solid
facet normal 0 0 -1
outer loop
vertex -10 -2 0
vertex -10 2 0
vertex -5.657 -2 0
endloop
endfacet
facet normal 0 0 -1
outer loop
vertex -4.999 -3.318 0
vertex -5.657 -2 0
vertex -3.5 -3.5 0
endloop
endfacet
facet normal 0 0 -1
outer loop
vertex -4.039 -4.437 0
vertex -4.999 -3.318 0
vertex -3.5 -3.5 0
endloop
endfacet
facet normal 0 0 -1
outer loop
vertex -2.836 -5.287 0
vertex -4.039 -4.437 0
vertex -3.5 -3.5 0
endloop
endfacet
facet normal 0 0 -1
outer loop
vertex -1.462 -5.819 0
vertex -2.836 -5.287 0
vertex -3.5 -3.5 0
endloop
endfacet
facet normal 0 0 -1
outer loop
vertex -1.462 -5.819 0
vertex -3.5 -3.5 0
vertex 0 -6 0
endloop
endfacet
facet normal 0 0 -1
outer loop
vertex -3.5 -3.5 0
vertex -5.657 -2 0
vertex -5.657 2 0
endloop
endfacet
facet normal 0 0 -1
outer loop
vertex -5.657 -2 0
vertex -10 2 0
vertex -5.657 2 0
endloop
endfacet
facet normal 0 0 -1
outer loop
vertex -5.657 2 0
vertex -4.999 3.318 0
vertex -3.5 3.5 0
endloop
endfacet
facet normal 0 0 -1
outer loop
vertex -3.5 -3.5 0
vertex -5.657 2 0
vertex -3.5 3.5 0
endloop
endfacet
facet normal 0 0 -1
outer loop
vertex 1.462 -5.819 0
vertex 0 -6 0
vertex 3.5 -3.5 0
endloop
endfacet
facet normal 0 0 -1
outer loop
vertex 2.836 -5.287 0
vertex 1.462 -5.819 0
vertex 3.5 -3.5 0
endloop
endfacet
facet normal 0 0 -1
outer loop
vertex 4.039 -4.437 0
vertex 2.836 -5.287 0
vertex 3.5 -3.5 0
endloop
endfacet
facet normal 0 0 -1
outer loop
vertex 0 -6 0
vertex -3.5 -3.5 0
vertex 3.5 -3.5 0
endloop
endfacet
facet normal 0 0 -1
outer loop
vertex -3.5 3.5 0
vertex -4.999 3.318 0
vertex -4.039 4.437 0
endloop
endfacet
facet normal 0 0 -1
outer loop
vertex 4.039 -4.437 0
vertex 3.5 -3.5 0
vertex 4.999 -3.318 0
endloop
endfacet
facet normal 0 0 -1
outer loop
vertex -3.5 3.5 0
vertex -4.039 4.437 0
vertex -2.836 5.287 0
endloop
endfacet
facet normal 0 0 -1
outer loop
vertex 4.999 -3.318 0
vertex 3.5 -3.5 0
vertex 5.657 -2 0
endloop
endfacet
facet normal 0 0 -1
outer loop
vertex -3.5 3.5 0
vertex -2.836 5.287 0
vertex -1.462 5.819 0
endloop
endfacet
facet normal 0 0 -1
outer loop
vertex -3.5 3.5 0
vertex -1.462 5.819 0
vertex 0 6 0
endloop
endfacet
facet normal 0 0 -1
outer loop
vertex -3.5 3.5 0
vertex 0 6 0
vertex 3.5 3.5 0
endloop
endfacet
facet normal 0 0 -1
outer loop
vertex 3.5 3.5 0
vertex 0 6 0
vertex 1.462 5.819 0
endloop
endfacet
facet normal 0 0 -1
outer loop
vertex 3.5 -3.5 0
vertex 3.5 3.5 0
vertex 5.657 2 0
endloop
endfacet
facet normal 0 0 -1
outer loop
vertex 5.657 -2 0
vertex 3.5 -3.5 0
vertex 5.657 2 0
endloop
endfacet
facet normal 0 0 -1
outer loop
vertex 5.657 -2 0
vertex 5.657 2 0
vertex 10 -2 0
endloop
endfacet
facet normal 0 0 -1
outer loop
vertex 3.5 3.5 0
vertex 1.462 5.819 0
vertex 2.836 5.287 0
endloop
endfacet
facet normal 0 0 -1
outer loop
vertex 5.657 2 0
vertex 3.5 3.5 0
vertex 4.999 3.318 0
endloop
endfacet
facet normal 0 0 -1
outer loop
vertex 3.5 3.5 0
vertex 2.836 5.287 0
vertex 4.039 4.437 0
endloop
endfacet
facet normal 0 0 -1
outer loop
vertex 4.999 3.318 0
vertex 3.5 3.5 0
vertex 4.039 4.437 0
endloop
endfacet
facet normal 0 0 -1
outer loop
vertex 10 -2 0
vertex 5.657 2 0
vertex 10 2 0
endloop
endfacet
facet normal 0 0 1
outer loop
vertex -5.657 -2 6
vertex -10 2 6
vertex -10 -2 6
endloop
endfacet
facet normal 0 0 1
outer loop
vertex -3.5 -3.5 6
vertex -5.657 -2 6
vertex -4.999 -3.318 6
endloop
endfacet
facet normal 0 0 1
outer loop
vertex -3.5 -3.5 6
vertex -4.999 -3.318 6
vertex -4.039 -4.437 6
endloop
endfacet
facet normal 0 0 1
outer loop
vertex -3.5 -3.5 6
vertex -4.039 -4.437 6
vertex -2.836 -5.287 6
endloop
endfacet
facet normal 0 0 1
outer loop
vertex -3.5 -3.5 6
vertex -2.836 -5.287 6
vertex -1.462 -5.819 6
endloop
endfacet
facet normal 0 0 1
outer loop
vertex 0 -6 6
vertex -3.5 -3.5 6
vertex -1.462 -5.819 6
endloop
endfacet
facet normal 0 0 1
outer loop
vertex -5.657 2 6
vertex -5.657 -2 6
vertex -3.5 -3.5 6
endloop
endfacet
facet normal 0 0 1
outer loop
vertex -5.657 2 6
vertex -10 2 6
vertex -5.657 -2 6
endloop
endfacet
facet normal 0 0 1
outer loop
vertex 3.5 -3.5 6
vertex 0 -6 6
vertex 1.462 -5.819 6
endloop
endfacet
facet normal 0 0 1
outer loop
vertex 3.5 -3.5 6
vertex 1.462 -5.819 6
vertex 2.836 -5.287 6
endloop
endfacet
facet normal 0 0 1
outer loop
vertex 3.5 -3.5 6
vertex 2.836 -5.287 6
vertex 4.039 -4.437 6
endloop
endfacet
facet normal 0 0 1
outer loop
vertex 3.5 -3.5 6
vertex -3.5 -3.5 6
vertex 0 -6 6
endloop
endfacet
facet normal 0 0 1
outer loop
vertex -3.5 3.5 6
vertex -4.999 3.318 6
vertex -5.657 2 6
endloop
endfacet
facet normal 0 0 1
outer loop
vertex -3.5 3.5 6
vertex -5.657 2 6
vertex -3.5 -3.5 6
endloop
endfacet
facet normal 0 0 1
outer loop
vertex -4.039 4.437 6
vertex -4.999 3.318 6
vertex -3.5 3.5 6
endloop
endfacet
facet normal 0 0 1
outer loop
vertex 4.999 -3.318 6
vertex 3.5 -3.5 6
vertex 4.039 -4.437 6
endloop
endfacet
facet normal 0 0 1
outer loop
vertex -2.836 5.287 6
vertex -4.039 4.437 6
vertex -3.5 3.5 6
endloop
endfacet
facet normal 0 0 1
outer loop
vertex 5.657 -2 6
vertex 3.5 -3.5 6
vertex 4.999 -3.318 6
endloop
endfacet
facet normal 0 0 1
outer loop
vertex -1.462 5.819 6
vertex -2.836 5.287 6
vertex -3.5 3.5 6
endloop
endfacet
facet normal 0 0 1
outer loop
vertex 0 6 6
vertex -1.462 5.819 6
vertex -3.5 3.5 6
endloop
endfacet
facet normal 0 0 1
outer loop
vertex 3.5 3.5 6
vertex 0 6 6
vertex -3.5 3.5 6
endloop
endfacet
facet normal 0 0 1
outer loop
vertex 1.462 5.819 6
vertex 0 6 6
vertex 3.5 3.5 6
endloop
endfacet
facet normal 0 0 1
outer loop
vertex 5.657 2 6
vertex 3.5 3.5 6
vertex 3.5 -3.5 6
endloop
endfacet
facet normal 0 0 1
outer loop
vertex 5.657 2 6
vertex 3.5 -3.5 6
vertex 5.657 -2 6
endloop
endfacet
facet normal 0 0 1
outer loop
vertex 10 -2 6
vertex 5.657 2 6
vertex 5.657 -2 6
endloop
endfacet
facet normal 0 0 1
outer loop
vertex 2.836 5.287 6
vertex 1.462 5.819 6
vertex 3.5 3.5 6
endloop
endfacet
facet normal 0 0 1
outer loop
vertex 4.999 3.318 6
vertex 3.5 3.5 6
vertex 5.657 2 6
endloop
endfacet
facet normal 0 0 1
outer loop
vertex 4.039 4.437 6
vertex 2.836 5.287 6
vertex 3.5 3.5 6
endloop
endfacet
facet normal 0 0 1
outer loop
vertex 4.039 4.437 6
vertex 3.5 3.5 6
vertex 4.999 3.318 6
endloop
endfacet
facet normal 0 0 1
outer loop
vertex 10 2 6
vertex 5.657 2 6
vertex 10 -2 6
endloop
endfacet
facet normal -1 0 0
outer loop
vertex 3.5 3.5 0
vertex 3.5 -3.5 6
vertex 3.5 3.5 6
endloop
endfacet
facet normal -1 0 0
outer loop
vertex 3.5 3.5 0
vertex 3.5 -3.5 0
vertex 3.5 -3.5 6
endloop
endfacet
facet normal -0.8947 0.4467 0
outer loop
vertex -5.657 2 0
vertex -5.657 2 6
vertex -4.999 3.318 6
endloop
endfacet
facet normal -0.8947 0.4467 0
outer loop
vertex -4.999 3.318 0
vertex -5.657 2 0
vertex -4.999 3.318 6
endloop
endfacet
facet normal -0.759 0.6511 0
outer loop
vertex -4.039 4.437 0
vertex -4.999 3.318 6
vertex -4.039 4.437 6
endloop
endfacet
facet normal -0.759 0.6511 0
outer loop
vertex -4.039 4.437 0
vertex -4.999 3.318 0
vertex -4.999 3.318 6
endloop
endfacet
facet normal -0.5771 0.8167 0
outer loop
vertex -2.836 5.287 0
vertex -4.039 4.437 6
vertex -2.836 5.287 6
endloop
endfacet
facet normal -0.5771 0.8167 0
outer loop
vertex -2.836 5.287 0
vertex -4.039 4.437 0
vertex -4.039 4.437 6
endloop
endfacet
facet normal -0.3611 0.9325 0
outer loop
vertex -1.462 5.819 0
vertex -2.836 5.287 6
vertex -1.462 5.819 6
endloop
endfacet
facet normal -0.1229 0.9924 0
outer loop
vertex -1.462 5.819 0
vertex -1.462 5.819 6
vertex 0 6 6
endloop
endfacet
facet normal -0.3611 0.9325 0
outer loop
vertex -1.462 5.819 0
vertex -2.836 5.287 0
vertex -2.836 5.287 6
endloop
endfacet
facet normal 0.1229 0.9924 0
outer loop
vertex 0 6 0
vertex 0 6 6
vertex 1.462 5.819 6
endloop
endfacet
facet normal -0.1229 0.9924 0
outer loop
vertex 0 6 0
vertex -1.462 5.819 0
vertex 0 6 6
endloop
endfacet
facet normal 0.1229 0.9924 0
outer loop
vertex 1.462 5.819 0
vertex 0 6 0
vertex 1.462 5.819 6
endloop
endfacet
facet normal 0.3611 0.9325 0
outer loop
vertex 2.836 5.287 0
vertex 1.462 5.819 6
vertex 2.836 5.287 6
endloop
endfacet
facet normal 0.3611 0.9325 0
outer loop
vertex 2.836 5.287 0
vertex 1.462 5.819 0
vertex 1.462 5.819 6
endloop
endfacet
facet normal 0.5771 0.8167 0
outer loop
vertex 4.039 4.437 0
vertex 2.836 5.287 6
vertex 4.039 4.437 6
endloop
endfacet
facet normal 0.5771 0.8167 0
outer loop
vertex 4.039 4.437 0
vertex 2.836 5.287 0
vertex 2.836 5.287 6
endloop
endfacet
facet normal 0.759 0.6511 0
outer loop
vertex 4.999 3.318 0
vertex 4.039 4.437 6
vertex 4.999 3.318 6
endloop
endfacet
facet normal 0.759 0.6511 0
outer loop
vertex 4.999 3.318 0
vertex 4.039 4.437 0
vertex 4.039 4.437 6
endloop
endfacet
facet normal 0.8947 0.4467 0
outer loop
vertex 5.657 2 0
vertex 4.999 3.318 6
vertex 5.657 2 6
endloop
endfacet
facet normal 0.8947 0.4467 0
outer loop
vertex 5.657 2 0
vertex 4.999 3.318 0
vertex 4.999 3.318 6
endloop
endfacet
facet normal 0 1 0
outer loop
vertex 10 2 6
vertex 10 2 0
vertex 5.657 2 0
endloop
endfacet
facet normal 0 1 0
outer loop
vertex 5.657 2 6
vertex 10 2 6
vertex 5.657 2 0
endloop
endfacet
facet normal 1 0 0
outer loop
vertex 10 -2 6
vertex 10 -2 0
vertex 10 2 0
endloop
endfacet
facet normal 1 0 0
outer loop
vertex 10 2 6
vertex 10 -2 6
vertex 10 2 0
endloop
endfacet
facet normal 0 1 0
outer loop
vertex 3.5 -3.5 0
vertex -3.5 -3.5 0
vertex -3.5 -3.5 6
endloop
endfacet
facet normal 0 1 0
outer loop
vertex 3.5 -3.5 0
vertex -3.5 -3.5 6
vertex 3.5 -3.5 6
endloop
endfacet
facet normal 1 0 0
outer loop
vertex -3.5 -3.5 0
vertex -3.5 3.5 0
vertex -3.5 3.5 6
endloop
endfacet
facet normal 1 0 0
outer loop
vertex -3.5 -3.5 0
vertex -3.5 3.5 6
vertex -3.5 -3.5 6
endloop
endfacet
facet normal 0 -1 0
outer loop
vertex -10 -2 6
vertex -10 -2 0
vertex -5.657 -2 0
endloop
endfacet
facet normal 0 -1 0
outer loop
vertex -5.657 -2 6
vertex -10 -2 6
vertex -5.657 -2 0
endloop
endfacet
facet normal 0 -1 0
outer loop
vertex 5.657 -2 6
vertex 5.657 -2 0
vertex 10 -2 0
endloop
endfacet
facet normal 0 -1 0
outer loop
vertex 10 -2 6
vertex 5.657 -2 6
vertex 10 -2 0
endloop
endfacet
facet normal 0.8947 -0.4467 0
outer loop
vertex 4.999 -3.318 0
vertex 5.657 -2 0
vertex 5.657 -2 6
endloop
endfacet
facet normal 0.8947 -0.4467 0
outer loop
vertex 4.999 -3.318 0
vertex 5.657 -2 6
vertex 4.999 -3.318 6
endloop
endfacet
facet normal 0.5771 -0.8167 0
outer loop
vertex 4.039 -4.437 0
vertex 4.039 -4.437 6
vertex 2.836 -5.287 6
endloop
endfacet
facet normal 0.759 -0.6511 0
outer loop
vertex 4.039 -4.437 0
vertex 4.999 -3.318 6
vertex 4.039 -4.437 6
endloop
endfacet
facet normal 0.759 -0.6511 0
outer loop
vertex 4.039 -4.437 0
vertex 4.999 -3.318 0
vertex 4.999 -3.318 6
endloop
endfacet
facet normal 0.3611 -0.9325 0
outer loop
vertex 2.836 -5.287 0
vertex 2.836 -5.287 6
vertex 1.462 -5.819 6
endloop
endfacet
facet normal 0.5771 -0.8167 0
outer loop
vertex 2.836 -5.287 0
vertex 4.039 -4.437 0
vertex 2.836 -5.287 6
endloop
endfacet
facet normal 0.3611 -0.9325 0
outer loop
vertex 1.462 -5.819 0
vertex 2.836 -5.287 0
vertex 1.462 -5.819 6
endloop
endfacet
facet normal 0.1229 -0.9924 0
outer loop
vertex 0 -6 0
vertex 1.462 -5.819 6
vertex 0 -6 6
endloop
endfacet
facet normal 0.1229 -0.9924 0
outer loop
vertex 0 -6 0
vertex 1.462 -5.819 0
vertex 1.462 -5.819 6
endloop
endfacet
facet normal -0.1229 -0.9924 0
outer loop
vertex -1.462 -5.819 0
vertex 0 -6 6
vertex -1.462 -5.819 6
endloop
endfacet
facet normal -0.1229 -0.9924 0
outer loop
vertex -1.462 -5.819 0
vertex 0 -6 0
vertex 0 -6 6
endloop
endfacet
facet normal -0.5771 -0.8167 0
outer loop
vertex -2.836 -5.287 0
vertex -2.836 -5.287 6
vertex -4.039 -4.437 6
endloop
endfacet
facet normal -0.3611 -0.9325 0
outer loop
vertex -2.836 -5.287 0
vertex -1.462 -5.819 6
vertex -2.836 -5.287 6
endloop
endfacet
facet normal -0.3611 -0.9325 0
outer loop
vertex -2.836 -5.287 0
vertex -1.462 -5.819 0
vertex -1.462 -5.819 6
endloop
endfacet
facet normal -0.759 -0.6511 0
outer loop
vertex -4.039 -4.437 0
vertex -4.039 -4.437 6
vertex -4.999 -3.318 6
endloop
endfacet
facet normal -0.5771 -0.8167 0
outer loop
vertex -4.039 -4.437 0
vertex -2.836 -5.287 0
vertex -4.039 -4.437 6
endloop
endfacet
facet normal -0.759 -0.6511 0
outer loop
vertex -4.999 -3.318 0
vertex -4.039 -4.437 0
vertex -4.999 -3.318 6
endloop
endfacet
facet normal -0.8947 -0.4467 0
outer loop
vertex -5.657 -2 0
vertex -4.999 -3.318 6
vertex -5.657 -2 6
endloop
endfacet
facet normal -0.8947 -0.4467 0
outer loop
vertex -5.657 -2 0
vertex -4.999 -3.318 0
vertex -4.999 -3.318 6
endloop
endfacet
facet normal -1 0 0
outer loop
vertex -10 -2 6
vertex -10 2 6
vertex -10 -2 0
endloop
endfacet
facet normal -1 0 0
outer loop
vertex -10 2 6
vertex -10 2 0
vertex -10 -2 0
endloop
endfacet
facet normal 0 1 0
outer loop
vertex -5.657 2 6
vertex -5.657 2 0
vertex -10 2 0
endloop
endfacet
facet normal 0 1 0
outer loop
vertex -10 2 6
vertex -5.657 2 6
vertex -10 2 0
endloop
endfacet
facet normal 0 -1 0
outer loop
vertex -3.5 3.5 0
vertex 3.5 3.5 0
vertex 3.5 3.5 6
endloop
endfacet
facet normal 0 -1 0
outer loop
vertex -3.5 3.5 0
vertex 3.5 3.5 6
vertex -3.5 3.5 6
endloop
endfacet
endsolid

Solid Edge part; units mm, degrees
sketch "Sketch1" plane through (0, 0, 0) normal (0, 0, 1) x (1, 0, 0)
  line L0 (3.5, 3.5) -> (-3.5, 3.5)
  line L1 (-3.5, 3.5) -> (-3.5, -3.5)
  line L2 (-3.5, -3.5) -> (3.5, -3.5)
  line L3 (3.5, -3.5) -> (3.5, 3.5)
  line L4 (5.6569, -2) -> (10, -2)
  line L5 (10, -2) -> (10, 2)
  line L6 (10, 2) -> (5.6569, 2)
  arc A0 (-5.6569, 2) -> (5.6569, 2) centre (0, 0) cw
  line L7 (-5.6569, 2) -> (-10, 2)
  line L8 (-10, 2) -> (-10, -2)
  line L9 (-10, -2) -> (-5.6569, -2)
  arc A1 (-5.6569, -2) -> (5.6569, -2) centre (0, 0) ccw
extrude "Protrusion1" add sketch "Sketch1" along normal blind 6
